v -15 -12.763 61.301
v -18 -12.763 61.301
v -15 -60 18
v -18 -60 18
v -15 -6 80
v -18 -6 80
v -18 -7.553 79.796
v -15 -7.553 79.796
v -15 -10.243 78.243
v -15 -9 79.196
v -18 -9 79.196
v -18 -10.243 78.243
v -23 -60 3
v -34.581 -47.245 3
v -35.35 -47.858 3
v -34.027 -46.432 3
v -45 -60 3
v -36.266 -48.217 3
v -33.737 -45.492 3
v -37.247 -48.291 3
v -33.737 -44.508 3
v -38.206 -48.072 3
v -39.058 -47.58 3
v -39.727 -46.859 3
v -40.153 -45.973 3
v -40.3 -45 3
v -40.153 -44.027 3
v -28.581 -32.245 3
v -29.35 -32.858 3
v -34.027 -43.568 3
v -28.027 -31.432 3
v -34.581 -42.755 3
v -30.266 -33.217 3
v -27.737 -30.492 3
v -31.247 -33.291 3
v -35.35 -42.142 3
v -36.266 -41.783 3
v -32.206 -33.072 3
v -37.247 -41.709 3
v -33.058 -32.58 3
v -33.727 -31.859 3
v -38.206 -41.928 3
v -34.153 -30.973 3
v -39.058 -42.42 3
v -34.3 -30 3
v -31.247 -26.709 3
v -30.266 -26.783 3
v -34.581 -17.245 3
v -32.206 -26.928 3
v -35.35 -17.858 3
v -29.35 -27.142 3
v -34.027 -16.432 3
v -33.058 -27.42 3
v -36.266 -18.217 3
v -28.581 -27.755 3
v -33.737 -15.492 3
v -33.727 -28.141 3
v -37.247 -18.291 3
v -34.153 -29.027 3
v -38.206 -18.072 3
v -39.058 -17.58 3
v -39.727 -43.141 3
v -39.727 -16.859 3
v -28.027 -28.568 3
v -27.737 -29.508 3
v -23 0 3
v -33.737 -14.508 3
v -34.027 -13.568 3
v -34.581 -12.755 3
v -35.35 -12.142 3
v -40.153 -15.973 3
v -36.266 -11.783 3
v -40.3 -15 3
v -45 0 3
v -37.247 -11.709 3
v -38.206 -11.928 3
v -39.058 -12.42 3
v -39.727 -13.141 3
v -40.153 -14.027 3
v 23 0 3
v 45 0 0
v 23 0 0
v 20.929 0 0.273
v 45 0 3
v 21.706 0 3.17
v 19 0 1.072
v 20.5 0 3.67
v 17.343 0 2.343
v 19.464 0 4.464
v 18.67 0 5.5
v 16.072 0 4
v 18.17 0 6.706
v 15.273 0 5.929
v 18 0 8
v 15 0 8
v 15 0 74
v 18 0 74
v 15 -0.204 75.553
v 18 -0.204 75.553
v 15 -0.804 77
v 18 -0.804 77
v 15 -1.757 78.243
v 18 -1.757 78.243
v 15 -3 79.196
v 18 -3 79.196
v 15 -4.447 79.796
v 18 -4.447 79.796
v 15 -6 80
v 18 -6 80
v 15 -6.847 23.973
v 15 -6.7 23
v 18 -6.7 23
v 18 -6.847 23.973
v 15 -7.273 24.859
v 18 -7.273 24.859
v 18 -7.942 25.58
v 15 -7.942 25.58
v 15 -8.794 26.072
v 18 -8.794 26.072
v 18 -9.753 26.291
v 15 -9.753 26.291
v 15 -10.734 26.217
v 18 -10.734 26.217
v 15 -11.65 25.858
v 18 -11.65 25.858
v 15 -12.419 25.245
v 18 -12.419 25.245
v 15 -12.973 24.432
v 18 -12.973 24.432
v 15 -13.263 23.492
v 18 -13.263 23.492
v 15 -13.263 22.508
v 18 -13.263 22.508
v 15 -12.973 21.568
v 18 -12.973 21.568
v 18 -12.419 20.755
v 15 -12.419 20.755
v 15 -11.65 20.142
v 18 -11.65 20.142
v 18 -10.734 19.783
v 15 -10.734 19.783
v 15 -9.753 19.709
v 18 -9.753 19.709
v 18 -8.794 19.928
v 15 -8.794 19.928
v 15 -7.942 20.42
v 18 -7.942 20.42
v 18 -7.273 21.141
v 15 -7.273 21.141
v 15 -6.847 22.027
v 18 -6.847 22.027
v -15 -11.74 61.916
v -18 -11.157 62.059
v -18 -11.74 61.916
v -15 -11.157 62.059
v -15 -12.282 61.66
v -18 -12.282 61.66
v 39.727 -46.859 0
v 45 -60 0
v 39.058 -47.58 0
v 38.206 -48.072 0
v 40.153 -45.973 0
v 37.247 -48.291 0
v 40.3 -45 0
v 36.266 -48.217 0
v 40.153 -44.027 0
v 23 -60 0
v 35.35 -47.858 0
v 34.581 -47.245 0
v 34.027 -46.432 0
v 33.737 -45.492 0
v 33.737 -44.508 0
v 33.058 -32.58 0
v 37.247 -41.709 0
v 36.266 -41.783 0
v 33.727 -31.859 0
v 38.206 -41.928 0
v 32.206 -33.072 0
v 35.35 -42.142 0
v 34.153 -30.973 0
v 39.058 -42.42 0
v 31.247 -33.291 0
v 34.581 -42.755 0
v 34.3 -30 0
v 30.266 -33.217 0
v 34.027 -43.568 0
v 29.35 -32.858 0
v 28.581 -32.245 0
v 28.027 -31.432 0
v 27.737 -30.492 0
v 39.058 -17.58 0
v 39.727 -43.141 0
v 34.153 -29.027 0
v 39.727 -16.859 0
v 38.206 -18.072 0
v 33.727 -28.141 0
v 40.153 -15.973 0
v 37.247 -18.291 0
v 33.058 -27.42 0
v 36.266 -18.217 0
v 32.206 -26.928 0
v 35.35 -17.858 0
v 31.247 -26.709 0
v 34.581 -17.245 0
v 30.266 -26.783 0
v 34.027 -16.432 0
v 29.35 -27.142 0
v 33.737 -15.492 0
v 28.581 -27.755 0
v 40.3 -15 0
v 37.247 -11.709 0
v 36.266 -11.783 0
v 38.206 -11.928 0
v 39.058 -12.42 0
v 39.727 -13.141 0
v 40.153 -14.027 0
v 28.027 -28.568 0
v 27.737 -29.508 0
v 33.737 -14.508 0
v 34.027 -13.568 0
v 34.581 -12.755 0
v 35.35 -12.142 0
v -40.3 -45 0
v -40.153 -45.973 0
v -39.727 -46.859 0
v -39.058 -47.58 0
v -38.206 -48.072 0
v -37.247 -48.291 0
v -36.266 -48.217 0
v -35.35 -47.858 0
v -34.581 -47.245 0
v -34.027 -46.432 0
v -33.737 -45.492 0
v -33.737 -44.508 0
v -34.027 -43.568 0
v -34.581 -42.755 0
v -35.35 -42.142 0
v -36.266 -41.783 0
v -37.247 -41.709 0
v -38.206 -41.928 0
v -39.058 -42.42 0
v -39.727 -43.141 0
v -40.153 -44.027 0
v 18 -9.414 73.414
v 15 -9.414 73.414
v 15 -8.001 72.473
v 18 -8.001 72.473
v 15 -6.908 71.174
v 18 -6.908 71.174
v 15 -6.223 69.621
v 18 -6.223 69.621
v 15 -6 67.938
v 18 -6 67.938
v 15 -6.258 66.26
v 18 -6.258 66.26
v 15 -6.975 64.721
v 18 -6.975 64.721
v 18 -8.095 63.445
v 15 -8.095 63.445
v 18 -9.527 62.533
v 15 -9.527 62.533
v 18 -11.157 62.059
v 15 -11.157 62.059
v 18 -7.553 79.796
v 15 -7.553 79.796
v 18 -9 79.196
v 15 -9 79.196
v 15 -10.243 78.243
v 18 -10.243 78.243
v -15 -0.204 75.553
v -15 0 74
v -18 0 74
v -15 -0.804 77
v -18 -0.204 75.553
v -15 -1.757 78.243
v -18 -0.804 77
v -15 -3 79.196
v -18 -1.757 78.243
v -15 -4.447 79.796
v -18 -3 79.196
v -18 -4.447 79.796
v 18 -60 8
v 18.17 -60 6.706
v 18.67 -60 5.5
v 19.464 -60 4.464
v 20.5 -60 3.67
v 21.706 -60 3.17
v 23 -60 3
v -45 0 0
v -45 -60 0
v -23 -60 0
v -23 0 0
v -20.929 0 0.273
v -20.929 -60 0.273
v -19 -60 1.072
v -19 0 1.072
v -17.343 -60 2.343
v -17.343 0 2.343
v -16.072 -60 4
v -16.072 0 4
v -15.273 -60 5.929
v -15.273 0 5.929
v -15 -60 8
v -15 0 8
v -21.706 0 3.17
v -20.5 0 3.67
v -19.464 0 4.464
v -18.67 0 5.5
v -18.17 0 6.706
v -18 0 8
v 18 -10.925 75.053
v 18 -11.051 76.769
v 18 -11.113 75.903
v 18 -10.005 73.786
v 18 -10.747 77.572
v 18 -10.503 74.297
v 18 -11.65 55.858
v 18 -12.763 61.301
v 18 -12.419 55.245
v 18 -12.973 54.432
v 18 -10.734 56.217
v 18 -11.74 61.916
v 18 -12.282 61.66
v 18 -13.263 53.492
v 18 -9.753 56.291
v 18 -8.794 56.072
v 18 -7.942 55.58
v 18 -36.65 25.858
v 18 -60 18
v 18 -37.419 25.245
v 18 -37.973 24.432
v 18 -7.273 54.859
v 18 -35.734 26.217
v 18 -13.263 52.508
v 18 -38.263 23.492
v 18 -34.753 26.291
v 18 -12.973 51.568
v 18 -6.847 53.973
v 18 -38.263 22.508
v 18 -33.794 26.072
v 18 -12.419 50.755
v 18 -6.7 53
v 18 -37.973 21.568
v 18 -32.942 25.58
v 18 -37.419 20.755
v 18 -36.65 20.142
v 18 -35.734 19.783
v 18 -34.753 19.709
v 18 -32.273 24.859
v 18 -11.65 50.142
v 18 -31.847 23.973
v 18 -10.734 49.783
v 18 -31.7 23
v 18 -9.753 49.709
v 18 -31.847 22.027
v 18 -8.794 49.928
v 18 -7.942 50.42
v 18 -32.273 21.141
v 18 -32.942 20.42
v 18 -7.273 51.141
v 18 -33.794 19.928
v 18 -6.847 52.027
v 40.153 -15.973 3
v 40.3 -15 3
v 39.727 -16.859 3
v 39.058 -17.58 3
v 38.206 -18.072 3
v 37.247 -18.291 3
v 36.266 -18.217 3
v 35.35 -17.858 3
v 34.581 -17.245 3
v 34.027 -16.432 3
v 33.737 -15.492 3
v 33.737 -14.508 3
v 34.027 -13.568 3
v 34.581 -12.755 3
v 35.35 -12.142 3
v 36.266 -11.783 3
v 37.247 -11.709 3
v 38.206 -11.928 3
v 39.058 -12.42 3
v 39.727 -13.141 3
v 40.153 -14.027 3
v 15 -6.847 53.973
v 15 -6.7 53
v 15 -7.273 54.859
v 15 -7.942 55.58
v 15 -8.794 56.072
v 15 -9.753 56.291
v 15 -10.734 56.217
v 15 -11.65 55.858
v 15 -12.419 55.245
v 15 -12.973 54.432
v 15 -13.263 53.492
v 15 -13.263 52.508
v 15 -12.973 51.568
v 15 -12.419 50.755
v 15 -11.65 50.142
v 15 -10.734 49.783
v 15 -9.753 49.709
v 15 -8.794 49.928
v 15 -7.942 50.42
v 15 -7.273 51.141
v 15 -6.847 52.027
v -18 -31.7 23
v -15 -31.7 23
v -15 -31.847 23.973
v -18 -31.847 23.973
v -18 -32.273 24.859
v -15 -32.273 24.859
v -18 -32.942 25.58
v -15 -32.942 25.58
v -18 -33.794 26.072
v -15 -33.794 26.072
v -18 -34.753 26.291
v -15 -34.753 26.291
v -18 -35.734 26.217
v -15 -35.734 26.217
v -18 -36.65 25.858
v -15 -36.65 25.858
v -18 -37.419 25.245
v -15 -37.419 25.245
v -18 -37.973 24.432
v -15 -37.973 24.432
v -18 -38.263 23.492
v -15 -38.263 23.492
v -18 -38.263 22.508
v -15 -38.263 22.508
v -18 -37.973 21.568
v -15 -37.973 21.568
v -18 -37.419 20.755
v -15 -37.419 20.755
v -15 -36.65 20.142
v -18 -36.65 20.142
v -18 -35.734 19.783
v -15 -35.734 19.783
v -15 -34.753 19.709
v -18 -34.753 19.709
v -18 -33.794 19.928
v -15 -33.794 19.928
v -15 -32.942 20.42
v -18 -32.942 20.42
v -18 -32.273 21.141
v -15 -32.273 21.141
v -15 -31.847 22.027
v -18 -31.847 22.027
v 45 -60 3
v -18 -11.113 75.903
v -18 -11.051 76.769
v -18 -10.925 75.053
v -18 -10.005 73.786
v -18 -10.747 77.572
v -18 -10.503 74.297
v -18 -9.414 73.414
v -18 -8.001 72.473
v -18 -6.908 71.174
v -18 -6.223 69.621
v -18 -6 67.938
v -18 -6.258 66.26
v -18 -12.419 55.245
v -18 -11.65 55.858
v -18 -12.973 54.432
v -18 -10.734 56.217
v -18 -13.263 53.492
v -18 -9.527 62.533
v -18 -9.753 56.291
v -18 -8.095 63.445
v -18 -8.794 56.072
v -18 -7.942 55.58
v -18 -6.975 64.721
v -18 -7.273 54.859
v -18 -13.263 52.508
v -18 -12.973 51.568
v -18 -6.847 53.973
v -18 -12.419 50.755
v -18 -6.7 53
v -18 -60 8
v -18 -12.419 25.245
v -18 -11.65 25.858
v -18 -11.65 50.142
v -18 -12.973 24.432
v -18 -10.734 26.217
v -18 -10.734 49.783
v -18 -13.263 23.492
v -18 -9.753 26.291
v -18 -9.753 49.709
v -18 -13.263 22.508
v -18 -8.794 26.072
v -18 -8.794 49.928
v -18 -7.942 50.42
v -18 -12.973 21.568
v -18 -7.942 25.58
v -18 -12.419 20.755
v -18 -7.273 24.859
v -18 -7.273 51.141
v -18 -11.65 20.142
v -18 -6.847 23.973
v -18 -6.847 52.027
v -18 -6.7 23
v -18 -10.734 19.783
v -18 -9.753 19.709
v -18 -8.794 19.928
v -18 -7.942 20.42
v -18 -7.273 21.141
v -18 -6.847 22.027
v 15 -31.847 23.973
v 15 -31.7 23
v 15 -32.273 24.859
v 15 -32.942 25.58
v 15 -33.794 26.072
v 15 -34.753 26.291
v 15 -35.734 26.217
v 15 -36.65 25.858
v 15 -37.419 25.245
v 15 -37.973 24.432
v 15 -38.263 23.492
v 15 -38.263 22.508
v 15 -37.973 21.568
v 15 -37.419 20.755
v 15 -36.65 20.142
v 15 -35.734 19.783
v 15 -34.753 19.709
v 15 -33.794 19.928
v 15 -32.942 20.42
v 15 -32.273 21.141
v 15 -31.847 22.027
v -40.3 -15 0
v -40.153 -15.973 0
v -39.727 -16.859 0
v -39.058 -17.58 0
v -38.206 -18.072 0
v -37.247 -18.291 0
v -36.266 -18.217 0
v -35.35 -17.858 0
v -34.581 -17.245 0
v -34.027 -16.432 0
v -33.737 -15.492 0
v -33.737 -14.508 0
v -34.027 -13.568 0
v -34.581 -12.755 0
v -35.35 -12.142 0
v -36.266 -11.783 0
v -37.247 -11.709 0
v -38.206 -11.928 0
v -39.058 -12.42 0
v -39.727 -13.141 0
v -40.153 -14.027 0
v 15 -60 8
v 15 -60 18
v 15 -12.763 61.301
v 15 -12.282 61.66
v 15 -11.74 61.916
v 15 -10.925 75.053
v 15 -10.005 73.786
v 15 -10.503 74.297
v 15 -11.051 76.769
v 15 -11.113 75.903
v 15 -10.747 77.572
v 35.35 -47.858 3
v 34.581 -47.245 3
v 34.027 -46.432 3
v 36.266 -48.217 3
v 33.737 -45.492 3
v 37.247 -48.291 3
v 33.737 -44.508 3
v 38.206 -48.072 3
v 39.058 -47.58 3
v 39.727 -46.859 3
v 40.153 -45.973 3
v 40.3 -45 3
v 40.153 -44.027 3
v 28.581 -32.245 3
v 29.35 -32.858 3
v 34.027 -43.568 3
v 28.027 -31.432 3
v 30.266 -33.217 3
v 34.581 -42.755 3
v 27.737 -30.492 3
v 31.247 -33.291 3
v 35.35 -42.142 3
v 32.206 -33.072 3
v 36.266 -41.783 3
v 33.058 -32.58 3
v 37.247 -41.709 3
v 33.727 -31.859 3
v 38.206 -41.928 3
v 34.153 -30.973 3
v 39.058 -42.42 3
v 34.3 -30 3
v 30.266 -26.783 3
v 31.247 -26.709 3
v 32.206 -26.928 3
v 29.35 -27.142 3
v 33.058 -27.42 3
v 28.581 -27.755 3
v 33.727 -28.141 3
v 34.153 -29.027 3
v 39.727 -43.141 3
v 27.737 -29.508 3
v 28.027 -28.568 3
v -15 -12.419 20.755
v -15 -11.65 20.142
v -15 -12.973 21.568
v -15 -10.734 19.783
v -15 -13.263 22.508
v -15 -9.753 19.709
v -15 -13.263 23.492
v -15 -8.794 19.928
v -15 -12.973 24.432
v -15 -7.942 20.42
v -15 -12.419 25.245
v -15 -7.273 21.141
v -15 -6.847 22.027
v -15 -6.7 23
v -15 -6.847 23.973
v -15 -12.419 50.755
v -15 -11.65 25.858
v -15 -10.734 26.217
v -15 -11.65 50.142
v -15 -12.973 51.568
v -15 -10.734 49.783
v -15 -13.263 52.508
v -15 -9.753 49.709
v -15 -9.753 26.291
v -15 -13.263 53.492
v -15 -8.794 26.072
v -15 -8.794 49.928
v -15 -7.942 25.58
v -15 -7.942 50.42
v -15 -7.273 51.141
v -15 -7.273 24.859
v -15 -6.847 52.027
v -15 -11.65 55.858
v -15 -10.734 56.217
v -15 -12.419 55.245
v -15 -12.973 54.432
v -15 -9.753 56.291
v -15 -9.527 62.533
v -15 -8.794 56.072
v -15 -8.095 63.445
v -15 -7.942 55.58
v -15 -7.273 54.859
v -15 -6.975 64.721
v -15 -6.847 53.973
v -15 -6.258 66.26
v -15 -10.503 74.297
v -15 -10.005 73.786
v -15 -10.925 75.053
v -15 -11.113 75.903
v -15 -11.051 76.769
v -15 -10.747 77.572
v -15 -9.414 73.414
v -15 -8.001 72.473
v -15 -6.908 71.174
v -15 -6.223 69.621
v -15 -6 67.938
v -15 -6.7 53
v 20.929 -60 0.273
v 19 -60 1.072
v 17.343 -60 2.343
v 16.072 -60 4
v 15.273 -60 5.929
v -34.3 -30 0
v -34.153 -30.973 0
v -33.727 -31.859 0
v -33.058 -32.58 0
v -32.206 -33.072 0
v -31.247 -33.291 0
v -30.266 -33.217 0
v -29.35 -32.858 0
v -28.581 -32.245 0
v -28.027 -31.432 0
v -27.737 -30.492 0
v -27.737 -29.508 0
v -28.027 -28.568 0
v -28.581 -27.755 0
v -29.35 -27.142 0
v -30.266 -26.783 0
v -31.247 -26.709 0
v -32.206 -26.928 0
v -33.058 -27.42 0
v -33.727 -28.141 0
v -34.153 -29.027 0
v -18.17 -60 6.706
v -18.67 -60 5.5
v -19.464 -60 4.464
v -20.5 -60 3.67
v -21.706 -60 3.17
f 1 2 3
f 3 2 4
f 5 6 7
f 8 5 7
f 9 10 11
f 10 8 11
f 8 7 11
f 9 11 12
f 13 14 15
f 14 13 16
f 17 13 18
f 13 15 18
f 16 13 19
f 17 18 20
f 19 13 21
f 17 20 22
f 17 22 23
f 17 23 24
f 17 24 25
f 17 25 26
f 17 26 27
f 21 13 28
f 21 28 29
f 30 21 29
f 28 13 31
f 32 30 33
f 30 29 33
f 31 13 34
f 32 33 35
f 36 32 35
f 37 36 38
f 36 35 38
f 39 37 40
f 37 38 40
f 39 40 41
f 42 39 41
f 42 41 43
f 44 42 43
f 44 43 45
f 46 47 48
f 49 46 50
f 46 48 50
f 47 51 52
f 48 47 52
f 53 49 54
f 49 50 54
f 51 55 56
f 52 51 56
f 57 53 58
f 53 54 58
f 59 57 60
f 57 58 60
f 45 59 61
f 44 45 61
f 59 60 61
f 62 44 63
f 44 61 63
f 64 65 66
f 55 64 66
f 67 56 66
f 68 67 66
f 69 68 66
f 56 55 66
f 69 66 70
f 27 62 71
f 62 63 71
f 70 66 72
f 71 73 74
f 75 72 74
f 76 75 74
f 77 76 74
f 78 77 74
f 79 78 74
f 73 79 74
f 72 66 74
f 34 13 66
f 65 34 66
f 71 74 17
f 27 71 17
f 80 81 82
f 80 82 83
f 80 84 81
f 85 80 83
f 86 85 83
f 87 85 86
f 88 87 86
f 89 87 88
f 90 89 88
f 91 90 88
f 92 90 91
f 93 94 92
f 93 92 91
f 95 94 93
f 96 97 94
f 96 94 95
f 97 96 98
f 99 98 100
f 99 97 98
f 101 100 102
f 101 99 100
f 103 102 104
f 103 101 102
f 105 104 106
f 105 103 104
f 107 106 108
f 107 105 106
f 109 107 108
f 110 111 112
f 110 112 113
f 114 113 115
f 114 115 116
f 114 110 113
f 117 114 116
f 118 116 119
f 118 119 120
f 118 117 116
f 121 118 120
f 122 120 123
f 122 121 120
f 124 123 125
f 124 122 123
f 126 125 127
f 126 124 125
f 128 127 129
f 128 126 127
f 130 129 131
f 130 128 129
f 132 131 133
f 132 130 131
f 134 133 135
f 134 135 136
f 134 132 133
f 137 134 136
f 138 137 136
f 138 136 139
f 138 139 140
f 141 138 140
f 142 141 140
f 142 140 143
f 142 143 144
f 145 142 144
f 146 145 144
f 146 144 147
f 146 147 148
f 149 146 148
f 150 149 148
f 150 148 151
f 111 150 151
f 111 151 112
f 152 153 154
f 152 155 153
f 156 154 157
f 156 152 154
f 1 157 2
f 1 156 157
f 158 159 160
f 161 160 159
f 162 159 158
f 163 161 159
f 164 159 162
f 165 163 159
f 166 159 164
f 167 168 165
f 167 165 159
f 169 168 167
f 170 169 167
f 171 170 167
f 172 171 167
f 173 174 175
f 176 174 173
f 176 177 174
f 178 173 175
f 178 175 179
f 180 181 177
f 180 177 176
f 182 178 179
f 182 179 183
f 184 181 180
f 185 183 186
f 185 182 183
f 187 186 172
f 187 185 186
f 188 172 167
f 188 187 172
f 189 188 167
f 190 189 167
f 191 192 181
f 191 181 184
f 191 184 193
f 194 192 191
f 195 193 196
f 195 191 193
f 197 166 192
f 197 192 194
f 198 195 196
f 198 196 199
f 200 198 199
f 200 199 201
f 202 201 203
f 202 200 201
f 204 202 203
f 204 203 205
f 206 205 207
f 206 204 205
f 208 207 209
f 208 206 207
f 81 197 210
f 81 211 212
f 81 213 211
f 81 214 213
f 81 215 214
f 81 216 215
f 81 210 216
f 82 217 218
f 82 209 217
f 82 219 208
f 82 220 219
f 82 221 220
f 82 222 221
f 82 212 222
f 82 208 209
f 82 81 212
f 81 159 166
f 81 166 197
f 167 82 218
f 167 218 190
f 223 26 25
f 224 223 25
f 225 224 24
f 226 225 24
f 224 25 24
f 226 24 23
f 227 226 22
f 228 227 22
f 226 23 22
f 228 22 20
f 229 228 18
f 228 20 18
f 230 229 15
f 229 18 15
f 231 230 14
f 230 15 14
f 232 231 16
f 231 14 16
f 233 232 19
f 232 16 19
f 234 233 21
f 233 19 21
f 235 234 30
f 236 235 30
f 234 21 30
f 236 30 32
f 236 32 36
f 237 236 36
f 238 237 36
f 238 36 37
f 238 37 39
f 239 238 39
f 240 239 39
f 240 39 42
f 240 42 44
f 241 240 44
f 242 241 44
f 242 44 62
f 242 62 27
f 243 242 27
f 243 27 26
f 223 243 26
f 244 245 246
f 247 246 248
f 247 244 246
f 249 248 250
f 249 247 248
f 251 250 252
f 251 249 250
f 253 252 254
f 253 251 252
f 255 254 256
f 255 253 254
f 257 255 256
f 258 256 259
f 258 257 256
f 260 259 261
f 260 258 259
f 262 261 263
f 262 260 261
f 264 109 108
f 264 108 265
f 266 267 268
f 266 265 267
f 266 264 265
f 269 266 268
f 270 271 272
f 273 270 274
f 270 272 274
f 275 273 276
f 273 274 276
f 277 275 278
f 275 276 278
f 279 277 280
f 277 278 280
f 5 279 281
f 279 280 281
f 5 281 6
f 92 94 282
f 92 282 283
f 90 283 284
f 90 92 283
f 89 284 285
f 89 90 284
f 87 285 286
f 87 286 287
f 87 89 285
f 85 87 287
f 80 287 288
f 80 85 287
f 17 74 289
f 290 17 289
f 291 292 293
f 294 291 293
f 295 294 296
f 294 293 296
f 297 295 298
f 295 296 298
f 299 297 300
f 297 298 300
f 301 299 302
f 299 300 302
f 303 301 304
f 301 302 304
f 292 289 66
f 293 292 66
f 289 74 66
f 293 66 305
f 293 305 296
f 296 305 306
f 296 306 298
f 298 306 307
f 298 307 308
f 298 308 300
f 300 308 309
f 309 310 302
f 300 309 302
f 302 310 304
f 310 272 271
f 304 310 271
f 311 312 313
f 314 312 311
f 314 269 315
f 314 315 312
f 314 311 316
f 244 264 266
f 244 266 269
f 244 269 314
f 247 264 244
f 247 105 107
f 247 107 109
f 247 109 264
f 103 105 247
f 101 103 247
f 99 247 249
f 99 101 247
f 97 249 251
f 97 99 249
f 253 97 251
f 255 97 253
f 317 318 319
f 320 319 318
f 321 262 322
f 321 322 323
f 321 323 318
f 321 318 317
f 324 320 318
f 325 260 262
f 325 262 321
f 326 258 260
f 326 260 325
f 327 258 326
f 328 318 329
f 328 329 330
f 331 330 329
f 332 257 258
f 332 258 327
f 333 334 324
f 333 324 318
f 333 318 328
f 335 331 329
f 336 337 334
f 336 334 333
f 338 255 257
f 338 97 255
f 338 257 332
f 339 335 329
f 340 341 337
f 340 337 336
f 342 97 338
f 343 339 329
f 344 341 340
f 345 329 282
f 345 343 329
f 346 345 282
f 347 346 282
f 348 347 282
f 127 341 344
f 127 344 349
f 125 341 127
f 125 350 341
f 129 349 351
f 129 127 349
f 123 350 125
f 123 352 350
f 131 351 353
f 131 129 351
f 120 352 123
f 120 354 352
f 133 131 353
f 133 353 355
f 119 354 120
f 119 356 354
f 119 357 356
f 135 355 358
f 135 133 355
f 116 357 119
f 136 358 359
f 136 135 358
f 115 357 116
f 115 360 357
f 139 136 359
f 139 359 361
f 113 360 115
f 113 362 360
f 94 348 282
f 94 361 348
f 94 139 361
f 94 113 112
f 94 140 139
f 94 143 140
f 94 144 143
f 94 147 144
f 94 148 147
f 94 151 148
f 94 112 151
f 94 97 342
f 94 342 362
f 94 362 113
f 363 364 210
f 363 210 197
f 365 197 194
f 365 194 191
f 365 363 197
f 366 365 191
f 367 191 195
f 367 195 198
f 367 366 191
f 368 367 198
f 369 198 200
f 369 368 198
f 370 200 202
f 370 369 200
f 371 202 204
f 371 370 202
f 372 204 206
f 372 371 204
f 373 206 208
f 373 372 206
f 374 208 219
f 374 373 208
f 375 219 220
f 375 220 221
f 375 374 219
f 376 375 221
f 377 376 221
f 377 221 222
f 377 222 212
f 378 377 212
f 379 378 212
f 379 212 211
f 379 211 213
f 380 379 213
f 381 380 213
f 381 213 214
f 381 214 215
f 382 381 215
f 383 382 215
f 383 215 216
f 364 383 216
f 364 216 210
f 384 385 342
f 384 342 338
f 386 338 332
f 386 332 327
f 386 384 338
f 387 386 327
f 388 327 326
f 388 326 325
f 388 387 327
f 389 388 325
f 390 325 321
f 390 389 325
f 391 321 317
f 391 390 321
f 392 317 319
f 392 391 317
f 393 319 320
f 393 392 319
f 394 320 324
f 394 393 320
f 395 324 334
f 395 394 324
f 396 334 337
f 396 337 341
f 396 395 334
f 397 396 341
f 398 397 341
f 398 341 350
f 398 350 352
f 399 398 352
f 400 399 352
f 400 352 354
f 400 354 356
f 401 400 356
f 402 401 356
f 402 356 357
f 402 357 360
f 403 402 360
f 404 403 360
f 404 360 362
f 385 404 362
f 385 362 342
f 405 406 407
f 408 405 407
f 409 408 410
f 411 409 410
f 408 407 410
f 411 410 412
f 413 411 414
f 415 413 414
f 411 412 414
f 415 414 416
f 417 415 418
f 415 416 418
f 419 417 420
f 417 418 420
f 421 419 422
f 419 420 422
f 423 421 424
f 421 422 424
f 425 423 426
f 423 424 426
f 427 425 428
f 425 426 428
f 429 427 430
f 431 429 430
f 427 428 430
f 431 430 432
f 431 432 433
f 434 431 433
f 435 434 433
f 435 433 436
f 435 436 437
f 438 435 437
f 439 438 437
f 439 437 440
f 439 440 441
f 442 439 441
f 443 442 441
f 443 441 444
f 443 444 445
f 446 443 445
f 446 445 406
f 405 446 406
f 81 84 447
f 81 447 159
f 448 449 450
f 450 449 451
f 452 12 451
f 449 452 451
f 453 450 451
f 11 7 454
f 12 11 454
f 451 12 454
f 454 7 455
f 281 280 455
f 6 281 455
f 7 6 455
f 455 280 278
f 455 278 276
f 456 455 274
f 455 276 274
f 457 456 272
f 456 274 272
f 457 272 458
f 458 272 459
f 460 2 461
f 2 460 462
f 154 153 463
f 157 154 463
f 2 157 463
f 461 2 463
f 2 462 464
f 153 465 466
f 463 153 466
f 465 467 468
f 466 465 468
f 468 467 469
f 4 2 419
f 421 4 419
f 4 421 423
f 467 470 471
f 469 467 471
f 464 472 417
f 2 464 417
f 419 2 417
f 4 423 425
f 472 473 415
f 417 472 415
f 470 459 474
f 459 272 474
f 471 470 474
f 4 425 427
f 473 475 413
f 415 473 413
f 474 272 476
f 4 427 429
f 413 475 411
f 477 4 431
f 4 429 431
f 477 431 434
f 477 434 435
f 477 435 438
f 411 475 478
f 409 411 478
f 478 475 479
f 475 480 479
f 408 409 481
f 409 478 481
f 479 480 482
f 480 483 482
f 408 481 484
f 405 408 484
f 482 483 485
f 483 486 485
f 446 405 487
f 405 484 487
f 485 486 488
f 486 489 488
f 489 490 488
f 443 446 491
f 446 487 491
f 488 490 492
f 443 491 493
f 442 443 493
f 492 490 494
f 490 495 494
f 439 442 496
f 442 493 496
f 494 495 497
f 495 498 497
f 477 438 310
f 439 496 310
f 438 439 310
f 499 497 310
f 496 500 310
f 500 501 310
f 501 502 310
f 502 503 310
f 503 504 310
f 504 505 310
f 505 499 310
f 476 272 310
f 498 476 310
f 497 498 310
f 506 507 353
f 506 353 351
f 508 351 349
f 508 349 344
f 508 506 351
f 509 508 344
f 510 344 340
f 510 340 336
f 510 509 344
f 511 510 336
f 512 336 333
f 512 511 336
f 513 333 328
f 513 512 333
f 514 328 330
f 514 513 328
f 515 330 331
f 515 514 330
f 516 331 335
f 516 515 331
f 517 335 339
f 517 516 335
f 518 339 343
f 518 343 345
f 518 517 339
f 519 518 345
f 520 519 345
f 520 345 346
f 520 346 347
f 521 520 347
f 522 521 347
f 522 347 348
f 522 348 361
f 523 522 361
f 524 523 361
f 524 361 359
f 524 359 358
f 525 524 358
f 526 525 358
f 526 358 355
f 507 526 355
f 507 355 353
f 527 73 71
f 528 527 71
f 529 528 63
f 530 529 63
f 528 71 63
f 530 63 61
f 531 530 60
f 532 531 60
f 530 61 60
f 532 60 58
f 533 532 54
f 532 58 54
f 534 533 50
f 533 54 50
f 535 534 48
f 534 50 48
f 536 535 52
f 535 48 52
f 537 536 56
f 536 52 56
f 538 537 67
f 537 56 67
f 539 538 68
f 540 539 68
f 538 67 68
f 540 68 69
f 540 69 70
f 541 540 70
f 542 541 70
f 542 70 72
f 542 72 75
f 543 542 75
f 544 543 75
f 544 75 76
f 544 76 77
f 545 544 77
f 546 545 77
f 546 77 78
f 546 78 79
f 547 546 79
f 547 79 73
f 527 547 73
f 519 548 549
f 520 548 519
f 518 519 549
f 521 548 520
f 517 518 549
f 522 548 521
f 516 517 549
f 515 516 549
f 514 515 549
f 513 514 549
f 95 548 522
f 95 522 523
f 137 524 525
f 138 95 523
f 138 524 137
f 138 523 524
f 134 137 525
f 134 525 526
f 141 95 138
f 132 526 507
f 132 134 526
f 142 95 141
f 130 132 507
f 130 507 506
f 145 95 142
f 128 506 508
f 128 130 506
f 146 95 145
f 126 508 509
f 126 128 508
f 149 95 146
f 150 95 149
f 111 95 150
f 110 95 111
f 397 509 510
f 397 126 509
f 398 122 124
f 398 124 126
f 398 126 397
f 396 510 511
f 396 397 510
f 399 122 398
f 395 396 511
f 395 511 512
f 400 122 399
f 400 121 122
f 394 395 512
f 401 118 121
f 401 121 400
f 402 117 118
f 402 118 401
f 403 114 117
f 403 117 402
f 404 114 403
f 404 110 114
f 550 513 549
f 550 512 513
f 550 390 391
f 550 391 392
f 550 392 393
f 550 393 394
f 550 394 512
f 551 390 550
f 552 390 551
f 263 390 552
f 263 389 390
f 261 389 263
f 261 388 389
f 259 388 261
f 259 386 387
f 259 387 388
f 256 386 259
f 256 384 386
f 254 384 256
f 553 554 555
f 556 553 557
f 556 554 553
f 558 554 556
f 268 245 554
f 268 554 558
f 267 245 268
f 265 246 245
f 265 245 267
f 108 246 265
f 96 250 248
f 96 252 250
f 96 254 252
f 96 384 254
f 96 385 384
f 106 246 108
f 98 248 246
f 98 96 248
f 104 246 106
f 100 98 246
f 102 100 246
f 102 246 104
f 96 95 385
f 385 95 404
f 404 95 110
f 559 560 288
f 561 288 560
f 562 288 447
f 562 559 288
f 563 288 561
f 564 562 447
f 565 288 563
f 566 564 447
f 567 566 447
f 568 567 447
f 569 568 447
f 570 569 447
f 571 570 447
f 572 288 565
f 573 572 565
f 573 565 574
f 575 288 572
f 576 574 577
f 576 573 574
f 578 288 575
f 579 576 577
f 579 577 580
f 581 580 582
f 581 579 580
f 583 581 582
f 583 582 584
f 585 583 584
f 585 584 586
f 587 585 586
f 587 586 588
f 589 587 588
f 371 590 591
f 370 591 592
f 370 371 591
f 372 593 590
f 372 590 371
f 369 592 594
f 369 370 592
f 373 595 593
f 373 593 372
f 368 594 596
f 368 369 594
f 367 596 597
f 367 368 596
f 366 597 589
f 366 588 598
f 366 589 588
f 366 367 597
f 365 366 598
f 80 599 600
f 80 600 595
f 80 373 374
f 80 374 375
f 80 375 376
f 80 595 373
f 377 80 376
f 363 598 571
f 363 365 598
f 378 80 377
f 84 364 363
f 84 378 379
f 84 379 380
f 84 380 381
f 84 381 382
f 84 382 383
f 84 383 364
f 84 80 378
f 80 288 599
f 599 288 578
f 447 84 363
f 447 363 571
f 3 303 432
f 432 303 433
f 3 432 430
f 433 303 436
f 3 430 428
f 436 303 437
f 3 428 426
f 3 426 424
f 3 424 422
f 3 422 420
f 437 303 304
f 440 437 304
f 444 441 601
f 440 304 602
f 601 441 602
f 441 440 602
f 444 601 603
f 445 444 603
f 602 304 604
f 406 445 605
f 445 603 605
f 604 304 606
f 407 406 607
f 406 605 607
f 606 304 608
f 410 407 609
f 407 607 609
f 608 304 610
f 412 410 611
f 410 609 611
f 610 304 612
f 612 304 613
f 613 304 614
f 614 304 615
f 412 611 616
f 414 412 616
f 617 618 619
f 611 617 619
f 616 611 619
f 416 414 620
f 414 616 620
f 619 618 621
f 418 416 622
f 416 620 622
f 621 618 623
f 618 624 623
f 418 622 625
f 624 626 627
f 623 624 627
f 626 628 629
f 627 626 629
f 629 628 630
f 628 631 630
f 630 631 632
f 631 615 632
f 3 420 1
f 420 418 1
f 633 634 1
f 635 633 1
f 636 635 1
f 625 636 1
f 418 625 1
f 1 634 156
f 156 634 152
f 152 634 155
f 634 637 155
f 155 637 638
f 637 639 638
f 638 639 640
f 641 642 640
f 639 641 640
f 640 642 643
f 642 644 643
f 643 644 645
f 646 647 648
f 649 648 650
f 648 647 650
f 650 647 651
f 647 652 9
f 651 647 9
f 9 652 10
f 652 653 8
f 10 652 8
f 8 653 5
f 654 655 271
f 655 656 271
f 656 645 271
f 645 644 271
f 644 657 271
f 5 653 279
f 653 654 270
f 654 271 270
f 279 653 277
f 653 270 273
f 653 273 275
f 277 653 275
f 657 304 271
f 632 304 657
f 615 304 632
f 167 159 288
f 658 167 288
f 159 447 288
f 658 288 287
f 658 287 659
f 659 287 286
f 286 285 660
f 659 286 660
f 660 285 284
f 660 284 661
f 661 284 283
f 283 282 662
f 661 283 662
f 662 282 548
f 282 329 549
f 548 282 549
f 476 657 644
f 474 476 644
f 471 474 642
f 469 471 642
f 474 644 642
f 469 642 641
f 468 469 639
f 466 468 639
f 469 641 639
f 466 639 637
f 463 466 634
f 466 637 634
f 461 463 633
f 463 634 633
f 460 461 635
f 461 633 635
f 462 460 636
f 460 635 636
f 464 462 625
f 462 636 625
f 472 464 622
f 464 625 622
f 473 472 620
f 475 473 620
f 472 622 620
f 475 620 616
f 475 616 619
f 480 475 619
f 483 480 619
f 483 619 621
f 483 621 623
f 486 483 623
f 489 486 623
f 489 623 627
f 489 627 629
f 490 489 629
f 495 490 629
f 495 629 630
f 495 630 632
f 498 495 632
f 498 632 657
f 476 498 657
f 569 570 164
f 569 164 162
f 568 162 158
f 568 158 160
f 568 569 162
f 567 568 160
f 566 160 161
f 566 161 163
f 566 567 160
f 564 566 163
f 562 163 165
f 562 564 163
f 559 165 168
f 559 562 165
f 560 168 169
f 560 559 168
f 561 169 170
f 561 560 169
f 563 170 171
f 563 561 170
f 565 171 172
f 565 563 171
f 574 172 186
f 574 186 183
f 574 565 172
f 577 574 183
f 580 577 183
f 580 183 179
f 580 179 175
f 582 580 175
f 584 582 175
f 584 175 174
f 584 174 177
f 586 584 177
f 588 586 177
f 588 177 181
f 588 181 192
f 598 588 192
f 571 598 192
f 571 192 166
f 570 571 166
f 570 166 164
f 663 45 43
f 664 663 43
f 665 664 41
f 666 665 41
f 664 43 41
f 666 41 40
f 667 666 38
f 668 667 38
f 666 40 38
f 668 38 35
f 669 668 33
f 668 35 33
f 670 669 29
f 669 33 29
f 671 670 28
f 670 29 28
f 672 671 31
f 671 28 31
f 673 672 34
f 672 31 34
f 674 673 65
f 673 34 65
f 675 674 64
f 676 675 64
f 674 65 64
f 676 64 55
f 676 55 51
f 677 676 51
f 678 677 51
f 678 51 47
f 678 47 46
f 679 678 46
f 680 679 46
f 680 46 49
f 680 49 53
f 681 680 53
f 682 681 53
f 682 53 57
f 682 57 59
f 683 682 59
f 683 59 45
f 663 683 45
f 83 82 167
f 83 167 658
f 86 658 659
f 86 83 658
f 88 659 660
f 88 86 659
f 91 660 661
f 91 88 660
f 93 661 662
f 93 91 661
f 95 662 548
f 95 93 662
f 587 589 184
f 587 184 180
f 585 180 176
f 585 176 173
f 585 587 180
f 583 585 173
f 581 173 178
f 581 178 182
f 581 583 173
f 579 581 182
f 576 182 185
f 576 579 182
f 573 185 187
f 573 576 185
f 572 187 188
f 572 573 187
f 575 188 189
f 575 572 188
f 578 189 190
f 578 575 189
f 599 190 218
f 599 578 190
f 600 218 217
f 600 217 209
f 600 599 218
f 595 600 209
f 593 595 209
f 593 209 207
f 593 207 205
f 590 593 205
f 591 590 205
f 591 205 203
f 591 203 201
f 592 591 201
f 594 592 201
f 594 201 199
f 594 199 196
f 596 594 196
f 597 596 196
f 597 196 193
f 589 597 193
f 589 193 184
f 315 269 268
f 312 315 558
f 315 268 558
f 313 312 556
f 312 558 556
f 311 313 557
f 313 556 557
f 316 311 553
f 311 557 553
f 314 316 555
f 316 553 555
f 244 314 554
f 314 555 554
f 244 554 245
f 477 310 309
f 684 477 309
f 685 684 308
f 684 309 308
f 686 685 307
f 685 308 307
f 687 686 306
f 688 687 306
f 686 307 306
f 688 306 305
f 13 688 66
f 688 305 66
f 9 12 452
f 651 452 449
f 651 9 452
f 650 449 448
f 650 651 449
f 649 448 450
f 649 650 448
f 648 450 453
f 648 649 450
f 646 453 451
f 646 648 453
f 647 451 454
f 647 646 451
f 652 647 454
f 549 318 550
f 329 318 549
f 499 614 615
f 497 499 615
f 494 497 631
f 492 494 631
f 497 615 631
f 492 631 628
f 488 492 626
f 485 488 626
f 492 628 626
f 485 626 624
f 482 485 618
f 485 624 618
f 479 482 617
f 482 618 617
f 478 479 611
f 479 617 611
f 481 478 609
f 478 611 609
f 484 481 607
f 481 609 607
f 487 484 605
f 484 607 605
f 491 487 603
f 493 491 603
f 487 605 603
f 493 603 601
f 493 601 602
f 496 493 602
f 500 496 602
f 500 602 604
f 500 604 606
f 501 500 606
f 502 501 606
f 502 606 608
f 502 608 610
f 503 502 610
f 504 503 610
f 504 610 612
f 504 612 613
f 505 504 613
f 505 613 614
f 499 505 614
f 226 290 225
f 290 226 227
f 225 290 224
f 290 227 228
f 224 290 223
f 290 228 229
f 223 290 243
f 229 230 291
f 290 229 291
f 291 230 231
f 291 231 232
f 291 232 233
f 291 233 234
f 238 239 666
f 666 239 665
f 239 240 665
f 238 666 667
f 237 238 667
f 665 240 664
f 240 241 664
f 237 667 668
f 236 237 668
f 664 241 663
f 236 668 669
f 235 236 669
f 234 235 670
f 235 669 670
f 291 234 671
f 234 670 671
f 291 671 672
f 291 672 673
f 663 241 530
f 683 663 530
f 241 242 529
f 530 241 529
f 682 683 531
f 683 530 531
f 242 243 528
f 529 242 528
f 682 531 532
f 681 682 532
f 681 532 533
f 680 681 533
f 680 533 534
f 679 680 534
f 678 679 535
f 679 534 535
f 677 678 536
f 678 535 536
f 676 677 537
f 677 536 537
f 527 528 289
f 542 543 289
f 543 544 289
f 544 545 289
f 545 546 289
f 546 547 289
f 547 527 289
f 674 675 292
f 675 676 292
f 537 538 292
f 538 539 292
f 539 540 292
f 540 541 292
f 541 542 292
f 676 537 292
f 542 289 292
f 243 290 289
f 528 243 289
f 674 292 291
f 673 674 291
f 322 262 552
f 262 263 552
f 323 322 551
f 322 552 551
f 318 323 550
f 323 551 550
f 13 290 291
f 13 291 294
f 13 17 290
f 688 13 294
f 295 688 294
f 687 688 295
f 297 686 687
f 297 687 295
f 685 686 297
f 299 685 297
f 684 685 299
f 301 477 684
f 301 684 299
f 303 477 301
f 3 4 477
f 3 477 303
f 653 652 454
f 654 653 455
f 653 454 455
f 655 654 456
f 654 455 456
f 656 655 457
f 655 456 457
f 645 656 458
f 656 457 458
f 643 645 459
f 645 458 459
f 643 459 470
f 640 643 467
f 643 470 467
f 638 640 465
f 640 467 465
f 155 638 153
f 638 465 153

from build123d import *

# Parameters (mm, degrees)
F1_DEPTH = 60
F3_DEPTH = 25
F4_R     = 3
F6_D     = 6.6
F8_D     = 6.6


# Not quite as in the source:
# - a feature names something its author has since deleted; it is built from what else it names


with BuildPart() as f1:
    # F0 (on Front) → F1 (new body)
    with BuildSketch(Plane.XZ):
        with BuildLine():
            ThreePointArc((-23, 0), (-17.3431457505, 2.3431457505), (-15, 8))
            Line((-15, 8), (-15, 80))
            Line((-15, 80), (-18, 80))
            Line((-18, 80), (-18, 8))
            ThreePointArc((-18, 8), (-19.4644660941, 4.4644660941), (-23, 3))
            Line((-23, 3), (-45, 3))
            Line((-45, 3), (-45, 0))
            Line((-45, 0), (-23, 0))
        make_face()
    extrude(amount=F1_DEPTH)

    # F2 (on face) → F3 (cut)
    with BuildSketch(Plane(origin=(-18, 0, 0), x_dir=(0, -1, 0), z_dir=(-1, 0, 0))):
        with BuildLine():
            Line((60, 18), (60, 80))
            Line((60, 80), (6.0000000167, 80))
            ThreePointArc((6.0000000167, 80), (10.242640693, 78.2426406812), (12, 74))
            ThreePointArc((12, 74), (6, 68), (12, 62))
            Line((12, 62), (60, 18))
        make_face()
        with BuildLine():
            ThreePointArc((0, 74), (1.7573593188, 78.242640693), (6.0000000167, 80))
            Line((6.0000000167, 80), (0, 80))
            Line((0, 80), (0, 74))
        make_face()
    extrude(amount=-F3_DEPTH, mode=Mode.SUBTRACT)

    # F4
    f4_edges = [f1.edges().sort_by_distance(p)[0] for p in [
        (-16.5, -12, 74),
        (-16.5, -12, 62),
    ]]
    fillet(f4_edges, radius=F4_R)

    # F6 (through all)
    with Locations(Plane(origin=(0, 0, 0), x_dir=(1, 0, 0), z_dir=(0, 0, -1))):
        with Locations((-37, 15), (-31, 30), (-37, 45)):
            Hole(F6_D / 2)

    # F8 (through all)
    with Locations(Plane(origin=(-18, 0, 0), x_dir=(0, -1, 0), z_dir=(-1, 0, 0))):
        with Locations((10, 53), (10, 23), (35, 23)):
            Hole(F8_D / 2)


with BuildPart() as f9_1:
    # F9: instance of F1
    add(f1.part.mirror(Plane.YZ))


solid = Compound([f1.part, f9_1.part])
